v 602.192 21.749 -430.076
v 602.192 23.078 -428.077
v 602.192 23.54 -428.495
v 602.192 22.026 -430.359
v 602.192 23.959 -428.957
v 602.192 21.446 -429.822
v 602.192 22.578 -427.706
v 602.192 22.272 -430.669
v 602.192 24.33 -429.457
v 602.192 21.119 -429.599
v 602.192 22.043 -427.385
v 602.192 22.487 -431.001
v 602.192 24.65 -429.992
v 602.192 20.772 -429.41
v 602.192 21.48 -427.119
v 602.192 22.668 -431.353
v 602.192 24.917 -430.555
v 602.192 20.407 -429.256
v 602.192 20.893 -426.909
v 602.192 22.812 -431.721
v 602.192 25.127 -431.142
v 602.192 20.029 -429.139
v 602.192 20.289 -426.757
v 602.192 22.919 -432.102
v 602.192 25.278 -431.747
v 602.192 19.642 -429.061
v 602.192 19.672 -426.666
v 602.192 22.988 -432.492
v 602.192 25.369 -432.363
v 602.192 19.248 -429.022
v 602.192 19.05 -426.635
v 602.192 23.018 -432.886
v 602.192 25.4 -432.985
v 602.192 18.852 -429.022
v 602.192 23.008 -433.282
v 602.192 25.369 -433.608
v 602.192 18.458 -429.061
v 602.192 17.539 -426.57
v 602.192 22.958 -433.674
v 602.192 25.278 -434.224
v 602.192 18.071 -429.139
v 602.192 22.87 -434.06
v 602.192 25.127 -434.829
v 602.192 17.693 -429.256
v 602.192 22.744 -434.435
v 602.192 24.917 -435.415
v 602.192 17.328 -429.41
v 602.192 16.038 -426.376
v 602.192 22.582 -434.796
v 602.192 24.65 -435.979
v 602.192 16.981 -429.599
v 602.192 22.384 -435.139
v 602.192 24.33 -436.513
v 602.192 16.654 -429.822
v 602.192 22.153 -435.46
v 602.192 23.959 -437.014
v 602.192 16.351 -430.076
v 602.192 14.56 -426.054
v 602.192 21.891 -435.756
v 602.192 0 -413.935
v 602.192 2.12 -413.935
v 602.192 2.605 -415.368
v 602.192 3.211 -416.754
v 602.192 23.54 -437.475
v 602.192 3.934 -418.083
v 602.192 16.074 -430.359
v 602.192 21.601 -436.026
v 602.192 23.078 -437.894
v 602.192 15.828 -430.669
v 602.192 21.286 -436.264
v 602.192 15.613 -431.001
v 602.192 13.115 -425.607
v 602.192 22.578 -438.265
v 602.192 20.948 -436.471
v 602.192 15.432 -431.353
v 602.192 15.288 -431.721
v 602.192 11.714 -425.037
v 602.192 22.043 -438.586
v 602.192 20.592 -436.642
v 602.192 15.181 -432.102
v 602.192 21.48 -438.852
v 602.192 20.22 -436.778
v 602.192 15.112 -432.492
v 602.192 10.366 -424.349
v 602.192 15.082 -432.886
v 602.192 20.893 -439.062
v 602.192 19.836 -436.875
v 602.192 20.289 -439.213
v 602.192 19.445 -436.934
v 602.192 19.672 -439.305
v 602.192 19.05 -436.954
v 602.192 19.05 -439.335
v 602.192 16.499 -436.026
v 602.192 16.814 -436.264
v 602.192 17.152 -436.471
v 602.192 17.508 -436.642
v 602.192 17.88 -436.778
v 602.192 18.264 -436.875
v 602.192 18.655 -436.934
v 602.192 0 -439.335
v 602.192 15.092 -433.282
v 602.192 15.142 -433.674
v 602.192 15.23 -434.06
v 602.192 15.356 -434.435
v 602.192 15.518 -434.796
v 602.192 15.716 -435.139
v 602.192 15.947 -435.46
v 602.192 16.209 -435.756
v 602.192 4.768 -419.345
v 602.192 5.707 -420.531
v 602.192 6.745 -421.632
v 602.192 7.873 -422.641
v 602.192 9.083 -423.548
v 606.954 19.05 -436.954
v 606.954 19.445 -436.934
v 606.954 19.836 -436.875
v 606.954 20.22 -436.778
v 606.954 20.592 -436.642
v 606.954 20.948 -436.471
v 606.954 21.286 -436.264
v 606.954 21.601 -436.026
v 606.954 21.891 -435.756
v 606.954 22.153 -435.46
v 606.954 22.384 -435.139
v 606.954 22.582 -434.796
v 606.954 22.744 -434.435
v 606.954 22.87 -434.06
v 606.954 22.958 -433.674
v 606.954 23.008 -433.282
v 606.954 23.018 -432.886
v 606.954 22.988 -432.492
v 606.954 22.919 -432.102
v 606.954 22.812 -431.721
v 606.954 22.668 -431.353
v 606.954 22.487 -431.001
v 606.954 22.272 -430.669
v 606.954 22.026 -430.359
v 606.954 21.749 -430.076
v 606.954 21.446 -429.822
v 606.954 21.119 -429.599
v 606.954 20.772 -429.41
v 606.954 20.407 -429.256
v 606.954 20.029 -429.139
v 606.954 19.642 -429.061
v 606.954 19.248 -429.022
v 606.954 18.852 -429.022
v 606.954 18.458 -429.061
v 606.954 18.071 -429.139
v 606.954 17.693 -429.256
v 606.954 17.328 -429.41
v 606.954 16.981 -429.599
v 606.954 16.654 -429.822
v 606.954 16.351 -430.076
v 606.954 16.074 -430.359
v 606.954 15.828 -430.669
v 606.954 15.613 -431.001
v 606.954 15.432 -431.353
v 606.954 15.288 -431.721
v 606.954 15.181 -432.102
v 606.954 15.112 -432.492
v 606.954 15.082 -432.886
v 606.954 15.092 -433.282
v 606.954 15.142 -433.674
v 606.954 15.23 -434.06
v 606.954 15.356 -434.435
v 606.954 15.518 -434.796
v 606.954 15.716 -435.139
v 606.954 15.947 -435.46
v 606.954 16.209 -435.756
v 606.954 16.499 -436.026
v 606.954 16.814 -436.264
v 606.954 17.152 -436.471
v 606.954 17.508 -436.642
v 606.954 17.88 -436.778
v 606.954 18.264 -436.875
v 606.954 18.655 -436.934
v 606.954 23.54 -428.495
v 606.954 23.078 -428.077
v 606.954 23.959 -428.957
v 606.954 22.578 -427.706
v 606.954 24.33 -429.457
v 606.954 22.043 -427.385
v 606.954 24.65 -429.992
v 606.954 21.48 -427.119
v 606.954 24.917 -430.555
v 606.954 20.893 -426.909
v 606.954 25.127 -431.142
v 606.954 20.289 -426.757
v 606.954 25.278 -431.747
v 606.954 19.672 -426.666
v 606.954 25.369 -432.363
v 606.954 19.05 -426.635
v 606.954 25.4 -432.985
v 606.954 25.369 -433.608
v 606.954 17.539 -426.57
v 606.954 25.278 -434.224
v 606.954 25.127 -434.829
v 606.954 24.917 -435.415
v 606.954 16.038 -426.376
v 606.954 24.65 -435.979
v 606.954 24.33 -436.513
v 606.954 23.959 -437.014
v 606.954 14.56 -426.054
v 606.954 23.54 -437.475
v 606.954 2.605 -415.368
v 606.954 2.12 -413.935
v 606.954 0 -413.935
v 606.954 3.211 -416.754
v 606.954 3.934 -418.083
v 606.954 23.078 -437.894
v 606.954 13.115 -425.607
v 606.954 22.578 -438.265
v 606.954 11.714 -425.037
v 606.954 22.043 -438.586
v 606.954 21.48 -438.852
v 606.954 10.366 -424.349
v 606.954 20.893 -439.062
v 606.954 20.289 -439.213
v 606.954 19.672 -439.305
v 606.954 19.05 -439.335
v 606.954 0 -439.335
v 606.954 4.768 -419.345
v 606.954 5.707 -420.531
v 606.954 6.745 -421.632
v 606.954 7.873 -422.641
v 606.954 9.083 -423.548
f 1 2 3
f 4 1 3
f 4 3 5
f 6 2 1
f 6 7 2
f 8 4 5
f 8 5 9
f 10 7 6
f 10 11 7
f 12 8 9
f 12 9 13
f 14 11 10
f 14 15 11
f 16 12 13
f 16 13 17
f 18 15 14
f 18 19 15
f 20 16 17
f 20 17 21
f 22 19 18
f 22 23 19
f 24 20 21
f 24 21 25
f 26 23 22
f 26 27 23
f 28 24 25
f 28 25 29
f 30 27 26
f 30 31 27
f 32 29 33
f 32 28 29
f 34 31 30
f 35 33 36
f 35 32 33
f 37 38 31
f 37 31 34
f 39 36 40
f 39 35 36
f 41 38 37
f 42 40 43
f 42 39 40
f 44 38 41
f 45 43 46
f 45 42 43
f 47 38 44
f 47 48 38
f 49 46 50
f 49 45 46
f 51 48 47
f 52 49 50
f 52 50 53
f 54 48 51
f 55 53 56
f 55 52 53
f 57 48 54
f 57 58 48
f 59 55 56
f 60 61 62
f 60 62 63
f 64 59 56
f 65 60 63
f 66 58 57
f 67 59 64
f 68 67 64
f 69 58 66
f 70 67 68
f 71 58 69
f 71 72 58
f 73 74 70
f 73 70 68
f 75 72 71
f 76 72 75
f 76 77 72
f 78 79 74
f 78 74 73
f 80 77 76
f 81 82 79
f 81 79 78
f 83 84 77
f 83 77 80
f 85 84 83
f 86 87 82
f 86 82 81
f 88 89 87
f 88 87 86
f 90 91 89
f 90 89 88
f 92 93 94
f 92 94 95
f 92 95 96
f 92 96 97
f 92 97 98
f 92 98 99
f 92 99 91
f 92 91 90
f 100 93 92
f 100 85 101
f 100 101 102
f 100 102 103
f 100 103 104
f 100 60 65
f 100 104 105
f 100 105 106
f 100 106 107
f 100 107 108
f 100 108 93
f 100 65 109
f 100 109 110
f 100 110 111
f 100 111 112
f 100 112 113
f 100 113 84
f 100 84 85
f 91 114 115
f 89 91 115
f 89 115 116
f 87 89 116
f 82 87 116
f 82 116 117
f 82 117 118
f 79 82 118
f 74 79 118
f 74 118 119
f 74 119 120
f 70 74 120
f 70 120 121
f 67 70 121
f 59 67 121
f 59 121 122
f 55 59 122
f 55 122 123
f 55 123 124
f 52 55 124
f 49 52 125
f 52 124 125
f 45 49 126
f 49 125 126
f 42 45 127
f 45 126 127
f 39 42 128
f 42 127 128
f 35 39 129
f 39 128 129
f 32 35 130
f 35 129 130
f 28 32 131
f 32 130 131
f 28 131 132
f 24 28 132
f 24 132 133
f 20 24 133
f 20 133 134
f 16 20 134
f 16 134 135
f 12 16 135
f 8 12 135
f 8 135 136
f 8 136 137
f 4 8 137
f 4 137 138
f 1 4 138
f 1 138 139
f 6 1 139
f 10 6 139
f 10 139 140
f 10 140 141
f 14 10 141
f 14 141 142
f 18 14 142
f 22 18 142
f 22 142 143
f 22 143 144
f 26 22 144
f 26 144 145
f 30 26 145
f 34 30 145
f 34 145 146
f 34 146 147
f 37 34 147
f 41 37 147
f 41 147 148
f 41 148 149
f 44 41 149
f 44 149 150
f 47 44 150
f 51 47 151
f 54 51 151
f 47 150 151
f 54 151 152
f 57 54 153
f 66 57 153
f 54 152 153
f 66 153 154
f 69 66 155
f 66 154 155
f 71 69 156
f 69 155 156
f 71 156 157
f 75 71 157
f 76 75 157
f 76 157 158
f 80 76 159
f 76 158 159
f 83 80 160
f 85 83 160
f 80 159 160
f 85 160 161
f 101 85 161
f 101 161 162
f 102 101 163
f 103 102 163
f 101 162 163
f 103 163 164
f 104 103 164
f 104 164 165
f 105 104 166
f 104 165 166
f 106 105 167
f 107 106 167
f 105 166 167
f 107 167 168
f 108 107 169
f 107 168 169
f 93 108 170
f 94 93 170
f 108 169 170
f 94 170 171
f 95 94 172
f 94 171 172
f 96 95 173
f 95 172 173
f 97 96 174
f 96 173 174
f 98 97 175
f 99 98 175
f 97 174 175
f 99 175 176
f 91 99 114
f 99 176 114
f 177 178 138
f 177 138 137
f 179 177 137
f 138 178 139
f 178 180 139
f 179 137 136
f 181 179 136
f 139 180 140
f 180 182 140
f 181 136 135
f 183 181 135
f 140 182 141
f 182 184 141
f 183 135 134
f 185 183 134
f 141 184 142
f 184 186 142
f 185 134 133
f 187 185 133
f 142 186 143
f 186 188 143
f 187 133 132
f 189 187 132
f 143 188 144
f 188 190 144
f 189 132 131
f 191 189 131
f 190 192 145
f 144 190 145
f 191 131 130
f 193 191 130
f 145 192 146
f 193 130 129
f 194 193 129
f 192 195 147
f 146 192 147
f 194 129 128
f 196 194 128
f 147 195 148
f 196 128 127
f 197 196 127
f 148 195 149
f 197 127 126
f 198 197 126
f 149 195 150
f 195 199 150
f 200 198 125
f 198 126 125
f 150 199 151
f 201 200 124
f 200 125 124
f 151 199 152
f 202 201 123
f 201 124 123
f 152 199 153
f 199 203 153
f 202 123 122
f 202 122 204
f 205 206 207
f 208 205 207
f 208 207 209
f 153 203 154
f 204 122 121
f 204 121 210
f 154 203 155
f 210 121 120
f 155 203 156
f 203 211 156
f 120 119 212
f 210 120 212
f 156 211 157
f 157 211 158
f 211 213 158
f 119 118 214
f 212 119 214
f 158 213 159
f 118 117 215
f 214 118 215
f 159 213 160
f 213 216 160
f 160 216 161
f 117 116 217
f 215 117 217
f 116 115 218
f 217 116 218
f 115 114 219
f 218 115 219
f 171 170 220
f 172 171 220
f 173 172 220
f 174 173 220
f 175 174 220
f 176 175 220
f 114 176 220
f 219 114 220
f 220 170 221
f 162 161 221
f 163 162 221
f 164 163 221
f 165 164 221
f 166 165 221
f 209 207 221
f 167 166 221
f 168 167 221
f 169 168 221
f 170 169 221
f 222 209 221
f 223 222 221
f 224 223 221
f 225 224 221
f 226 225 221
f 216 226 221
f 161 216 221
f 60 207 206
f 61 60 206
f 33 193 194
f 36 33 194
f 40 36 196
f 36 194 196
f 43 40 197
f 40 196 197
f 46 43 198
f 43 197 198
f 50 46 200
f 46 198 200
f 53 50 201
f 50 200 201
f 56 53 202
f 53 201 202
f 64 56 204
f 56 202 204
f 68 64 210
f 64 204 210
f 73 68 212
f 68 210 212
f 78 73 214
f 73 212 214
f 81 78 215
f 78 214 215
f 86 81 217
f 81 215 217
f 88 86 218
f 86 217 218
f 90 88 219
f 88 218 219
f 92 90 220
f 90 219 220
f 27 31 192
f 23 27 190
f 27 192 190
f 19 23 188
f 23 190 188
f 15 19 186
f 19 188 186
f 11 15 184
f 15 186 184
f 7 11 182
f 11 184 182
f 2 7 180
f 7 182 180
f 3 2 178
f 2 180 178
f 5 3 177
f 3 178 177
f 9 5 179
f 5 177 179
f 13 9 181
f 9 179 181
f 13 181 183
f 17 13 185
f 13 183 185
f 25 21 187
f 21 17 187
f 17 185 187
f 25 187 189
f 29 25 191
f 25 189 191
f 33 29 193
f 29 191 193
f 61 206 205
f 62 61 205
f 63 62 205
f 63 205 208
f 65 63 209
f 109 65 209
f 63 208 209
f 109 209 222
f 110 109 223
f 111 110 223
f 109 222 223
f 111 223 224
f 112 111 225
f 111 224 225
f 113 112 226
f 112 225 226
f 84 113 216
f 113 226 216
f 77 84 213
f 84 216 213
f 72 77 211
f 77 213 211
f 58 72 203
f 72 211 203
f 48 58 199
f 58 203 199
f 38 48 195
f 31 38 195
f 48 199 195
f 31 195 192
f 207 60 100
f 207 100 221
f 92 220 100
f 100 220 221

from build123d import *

# Parameters (mm, degrees)
CROQUIS1_W              = 4.7625
CROQUIS1_H              = 42.333333333
SALIENTE_EXTRUIR1_DEPTH = 25.4
CROQUIS2_R              = 3.96875
CORTAR_EXTRUIR1_DEPTH   = 25.4


with BuildPart() as part:
    # Croquis1 → Saliente-Extruir1 (new body)
    with BuildSketch(Plane(origin=(0, 0, 0), x_dir=(1, 0, 0), z_dir=(0, 1, 0))):
        with Locations((604.572916667, 432.985333334)):
            Rectangle(CROQUIS1_W, CROQUIS1_H)
    extrude(amount=SALIENTE_EXTRUIR1_DEPTH)

    # Croquis2 → Cortar-Extruir1 (cut)
    with BuildSketch(Plane(origin=(606.954166667, 0, 0), x_dir=(0, 0, -1), z_dir=(1, 0, 0))):
        with BuildLine():
            ThreePointArc((426.635333333, 19.05), (428.495205273, 23.540128061), (432.985333333, 25.4))
            Line((432.985333333, 25.4), (411.818666667, 25.4))
            Line((411.818666667, 25.4), (411.818666667, 0))
            Line((411.818666667, 0), (413.935333333, 0))
            Line((413.935333333, 0), (413.935333333, 2.12))
            ThreePointArc((413.935333333, 2.12), (423.10744442, 8.467999953), (426.635333333, 19.05))
        make_face()
        with BuildLine():
            ThreePointArc((432.985333333, 25.4), (437.475461394, 23.540128061), (439.335333333, 19.05))
            Line((439.335333333, 19.05), (439.335333333, 0))
            Line((439.335333333, 0), (454.152, 0))
            Line((454.152, 0), (454.152, 25.4))
            Line((454.152, 25.4), (432.985333333, 25.4))
        make_face()
        with Locations((432.985333333, 19.05)):
            Circle(CROQUIS2_R)
    extrude(amount=-CORTAR_EXTRUIR1_DEPTH, mode=Mode.SUBTRACT)


solid = part.part
